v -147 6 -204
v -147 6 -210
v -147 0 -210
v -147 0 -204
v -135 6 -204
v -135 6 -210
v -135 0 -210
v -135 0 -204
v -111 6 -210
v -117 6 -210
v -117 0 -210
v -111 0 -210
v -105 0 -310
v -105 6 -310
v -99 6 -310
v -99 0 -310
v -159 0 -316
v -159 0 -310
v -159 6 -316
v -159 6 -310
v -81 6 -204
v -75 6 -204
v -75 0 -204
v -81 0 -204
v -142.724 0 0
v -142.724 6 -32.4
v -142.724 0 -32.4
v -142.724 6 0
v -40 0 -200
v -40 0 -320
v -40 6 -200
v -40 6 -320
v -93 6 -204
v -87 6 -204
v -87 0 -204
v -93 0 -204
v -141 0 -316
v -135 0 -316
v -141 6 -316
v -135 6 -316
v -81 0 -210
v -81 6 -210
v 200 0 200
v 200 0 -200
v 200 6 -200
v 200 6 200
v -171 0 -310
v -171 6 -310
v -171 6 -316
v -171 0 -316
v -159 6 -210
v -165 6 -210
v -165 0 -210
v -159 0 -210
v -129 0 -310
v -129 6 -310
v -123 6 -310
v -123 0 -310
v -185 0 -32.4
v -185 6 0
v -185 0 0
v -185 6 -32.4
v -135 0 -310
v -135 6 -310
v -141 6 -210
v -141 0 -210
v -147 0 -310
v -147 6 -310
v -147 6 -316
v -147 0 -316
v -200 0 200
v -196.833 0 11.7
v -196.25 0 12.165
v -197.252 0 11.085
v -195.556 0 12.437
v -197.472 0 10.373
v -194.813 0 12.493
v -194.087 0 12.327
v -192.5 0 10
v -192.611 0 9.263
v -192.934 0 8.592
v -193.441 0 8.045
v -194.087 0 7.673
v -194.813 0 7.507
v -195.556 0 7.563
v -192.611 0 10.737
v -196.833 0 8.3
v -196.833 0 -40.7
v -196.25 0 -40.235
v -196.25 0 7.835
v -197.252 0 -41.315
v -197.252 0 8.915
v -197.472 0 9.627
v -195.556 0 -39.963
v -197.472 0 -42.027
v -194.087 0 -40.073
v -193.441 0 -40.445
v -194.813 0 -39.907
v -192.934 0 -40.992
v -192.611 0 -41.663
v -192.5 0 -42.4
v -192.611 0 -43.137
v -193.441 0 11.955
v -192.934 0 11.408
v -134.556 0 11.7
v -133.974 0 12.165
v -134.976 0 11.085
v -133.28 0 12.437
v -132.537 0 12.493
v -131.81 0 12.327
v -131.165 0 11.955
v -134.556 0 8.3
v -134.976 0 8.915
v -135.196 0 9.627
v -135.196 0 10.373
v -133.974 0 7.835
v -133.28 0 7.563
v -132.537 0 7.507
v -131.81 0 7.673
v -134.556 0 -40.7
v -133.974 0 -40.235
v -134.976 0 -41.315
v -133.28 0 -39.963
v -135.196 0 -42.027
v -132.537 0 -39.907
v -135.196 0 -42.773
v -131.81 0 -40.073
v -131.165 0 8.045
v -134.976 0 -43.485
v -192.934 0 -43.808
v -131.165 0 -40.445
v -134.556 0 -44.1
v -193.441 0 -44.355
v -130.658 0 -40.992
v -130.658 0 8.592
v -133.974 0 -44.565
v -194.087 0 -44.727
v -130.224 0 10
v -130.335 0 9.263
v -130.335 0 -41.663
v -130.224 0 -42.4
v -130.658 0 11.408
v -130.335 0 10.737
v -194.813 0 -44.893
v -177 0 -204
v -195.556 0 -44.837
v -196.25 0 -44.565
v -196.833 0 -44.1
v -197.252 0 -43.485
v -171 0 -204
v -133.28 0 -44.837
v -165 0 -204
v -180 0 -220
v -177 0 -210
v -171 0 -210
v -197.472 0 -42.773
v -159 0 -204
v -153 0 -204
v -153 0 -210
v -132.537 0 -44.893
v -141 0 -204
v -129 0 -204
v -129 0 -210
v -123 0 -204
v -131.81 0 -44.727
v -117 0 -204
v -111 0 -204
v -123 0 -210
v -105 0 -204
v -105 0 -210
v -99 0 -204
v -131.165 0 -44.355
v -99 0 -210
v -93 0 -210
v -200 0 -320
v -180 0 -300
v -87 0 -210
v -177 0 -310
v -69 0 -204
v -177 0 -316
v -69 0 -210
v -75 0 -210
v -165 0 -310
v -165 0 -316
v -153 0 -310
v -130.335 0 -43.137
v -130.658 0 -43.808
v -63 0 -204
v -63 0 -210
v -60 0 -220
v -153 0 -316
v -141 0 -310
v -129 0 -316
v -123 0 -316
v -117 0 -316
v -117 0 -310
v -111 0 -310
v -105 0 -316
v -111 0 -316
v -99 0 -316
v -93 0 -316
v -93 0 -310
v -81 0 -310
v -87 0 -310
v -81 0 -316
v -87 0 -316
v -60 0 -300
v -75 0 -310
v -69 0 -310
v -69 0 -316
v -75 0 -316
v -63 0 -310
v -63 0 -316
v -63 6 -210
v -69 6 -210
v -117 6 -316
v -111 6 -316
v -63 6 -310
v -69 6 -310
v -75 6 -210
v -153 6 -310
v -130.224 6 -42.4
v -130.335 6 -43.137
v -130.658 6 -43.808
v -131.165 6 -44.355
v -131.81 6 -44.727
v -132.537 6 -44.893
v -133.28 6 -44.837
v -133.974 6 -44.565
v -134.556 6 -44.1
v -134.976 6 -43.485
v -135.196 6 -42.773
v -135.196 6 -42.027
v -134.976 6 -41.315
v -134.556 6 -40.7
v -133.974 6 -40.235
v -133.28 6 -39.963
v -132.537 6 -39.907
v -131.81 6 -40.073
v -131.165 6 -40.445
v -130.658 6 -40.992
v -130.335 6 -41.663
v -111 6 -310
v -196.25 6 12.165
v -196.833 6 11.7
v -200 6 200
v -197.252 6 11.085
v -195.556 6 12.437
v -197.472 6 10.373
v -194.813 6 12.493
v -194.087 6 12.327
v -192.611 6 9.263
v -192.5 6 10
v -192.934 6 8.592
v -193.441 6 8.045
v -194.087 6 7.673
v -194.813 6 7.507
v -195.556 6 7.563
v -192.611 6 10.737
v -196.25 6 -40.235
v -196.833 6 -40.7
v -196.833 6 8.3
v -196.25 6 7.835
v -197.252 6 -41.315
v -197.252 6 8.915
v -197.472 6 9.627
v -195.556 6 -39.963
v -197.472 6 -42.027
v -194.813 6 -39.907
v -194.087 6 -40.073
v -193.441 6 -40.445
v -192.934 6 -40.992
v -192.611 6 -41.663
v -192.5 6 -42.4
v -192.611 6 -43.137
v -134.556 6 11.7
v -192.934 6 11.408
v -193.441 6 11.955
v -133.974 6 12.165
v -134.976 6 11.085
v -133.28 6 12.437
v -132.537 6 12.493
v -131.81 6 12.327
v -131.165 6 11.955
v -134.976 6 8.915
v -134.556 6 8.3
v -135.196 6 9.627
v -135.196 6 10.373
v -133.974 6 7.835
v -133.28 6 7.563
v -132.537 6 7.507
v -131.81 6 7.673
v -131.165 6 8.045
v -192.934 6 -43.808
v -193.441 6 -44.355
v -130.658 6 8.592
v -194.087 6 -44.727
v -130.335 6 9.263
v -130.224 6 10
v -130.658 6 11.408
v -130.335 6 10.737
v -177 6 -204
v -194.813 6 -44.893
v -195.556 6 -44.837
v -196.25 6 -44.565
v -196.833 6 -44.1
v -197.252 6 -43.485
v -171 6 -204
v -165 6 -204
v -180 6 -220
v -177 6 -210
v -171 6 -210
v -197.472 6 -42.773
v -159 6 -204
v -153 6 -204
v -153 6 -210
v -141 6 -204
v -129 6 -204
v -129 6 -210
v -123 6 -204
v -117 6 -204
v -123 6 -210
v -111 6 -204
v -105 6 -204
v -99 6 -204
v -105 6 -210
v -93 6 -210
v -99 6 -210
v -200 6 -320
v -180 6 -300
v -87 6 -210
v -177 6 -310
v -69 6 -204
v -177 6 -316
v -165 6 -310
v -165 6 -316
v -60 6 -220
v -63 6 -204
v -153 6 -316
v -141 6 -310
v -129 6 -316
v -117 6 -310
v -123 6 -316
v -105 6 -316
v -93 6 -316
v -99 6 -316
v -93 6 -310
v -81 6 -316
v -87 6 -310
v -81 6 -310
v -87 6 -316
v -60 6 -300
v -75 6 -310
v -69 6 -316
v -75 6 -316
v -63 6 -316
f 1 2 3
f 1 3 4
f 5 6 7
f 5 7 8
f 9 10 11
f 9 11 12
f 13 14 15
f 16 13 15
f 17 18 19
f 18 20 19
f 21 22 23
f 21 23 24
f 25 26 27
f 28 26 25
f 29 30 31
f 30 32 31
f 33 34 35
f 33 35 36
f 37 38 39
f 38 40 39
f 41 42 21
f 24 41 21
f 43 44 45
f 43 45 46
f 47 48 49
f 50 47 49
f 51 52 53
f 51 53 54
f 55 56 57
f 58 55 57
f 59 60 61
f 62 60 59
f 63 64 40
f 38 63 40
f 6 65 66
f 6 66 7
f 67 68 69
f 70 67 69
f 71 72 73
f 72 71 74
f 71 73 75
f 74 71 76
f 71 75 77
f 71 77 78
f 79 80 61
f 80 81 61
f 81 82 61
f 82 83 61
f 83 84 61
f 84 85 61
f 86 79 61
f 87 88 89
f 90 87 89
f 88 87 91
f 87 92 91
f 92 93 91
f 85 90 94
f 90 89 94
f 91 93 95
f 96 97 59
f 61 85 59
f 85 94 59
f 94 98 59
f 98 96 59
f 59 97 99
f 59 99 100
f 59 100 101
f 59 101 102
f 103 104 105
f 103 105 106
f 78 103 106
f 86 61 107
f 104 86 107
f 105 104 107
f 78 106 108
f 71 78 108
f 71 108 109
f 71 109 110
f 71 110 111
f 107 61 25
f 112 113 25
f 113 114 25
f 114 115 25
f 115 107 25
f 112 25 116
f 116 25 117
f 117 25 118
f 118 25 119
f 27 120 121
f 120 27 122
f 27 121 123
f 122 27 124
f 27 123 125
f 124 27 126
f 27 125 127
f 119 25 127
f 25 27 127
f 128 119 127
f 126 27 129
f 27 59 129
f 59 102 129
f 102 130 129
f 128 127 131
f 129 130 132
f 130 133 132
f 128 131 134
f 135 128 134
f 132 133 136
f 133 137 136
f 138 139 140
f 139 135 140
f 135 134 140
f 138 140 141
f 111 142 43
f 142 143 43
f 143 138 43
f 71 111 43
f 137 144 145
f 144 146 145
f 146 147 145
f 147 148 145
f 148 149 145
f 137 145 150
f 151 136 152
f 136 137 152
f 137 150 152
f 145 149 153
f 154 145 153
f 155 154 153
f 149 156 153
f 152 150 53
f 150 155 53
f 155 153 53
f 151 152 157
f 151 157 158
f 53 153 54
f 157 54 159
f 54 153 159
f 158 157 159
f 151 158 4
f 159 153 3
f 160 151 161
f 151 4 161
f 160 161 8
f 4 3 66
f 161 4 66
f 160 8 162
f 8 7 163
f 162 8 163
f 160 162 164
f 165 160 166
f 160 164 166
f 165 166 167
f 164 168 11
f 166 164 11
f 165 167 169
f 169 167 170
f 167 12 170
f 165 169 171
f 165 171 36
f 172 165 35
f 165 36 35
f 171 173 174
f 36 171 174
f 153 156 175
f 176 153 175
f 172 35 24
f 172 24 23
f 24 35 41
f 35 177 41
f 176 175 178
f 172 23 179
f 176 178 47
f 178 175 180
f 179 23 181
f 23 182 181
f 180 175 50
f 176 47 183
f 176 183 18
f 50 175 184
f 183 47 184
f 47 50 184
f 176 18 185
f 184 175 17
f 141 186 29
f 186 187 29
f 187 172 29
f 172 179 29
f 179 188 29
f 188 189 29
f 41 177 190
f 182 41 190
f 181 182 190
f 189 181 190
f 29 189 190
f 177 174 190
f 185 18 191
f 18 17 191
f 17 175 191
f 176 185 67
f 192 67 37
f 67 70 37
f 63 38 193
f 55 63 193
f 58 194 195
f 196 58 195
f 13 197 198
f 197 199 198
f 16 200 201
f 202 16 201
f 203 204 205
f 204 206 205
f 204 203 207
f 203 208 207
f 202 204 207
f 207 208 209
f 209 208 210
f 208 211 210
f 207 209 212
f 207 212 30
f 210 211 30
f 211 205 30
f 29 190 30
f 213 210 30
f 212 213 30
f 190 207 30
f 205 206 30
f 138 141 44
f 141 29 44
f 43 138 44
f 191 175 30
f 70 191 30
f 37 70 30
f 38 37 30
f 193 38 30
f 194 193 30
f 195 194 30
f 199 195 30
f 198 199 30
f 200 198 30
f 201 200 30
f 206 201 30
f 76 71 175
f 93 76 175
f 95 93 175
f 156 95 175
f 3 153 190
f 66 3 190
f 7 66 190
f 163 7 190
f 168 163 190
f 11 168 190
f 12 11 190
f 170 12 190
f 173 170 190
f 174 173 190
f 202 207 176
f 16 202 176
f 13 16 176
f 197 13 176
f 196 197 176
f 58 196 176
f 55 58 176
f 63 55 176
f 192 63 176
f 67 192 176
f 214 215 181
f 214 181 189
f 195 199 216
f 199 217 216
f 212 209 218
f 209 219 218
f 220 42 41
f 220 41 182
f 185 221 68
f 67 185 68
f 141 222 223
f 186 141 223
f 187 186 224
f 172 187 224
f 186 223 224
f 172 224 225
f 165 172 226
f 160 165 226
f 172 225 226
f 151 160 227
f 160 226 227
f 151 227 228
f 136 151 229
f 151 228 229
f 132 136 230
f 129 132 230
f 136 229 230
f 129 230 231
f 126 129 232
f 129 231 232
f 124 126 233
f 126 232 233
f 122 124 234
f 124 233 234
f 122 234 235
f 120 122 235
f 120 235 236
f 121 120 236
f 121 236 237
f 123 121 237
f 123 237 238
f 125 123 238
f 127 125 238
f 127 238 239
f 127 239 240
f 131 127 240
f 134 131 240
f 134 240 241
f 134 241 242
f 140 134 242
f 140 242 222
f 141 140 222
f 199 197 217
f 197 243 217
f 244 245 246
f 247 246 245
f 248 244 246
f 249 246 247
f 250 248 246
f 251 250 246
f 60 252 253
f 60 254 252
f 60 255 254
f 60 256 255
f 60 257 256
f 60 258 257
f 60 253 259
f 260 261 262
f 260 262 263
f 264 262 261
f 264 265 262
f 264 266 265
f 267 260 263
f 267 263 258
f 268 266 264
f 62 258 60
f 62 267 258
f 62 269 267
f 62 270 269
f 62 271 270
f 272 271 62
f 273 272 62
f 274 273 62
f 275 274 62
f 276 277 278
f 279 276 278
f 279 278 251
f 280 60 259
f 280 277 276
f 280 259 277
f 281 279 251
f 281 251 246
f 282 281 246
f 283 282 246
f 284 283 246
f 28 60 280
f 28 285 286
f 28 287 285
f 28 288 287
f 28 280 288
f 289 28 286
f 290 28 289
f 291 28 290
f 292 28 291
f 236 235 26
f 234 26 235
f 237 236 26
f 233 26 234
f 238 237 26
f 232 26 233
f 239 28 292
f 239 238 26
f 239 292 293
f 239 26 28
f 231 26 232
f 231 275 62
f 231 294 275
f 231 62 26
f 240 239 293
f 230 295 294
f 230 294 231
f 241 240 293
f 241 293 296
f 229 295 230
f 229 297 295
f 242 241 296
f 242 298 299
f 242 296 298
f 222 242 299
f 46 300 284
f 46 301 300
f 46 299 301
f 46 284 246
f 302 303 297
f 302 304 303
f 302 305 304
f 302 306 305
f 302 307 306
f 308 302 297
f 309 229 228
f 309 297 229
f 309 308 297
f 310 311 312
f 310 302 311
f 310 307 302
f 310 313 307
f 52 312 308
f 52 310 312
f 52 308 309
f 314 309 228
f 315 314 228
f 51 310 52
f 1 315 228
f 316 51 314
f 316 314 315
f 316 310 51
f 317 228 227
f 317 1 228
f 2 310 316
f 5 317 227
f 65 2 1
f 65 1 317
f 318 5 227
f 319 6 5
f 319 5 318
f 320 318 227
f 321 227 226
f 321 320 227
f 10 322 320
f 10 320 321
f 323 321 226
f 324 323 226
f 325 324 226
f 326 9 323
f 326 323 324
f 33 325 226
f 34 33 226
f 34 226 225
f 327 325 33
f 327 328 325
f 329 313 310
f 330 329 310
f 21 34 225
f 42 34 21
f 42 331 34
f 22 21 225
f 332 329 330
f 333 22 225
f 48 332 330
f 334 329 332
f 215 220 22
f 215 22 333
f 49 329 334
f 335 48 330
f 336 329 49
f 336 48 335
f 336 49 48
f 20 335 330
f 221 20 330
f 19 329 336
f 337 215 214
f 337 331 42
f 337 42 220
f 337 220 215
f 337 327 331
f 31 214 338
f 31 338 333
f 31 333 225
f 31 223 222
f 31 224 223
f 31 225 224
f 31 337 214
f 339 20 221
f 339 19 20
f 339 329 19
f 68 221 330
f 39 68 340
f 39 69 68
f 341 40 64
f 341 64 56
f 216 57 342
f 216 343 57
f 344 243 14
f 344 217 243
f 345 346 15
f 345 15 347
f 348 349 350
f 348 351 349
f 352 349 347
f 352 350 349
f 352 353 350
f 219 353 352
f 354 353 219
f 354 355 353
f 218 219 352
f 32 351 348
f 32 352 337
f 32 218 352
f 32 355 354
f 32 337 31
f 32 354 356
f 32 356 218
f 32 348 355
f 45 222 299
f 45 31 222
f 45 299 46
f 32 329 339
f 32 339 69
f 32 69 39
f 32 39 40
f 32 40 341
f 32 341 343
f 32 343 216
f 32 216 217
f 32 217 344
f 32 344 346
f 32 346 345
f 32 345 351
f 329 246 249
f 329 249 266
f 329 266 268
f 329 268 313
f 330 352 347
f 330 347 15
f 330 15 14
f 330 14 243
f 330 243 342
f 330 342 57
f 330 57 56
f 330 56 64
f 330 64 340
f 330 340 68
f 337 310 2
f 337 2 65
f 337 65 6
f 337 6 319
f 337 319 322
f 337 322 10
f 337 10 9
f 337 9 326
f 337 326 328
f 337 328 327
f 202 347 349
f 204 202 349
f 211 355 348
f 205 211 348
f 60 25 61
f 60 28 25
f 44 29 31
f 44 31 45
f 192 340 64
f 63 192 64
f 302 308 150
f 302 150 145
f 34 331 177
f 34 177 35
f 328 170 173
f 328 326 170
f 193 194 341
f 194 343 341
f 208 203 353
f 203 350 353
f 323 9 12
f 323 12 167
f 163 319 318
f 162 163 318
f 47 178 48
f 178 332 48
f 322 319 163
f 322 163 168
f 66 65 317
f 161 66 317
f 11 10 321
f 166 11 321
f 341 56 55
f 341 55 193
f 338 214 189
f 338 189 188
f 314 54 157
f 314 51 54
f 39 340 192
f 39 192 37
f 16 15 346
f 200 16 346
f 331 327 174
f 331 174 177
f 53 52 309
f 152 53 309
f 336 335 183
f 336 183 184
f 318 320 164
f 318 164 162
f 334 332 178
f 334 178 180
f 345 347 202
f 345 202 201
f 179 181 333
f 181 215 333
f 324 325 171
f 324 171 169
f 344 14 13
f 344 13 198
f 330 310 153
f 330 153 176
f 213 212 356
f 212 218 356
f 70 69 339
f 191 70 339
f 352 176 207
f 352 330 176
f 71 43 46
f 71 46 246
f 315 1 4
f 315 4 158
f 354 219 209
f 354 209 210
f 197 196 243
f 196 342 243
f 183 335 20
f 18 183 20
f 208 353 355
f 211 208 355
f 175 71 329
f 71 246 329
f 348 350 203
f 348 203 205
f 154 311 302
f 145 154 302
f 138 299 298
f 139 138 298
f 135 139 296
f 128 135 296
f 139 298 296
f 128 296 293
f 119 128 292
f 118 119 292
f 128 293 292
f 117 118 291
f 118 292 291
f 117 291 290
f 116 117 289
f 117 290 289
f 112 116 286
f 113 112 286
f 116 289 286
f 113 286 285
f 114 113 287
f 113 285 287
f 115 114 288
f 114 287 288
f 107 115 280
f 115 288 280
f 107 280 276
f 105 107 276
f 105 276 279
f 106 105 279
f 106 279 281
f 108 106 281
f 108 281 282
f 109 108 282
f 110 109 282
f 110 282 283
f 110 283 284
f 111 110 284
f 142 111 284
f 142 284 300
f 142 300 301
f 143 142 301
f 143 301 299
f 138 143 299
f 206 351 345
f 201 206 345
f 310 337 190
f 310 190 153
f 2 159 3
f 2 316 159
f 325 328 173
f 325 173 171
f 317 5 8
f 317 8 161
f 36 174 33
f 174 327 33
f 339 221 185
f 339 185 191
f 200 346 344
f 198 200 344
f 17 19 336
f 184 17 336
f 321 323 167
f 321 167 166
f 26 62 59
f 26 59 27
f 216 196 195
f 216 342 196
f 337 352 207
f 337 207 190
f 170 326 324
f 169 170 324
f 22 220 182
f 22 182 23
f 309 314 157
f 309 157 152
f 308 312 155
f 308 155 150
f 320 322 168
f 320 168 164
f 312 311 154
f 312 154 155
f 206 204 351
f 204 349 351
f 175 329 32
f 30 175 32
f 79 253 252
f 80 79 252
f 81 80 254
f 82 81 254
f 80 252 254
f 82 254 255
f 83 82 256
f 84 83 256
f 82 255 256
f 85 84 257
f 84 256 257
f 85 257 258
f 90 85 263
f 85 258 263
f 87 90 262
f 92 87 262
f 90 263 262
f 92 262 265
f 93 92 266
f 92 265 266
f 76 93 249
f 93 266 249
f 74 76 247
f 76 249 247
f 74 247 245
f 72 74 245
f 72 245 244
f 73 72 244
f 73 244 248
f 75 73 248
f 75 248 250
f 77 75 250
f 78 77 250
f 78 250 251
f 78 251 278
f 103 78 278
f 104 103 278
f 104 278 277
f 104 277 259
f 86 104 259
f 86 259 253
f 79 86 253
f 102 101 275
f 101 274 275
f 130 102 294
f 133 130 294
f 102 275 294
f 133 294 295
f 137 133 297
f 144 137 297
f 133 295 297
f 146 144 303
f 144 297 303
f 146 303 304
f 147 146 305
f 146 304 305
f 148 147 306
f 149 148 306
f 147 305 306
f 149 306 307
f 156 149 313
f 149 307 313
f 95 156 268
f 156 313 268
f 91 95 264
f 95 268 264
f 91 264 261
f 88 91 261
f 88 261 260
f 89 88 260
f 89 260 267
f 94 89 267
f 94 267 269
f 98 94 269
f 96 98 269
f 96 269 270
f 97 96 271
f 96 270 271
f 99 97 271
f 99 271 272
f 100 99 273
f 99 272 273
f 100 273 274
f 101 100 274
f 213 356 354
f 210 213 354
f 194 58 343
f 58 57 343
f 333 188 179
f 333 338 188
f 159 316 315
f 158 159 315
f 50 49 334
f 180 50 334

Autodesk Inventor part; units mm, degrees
ref_plane "YZ Plane" through (0, 0, 0) normal (1, 0, 0) x (0, 1, 0)
ref_plane "XZ Plane" through (0, 0, 0) normal (0, 1, 0) x (-1, 0, 0)
ref_plane "XY Plane" through (0, 0, 0) normal (0, 0, 1) x (1, 0, 0)
sketch "Sketch1" plane through (0, 0, 0) normal (0, 1, 0) x (-1, 0, 0)
  line L0 (-200, 200) -> (200, 200)
  line L1 (200, 200) -> (200, -200)
  line L2 (200, -200) -> (-200, -200)
  line L3 (-200, -200) -> (-200, 200)
  line L4 (-200, 200) -> (200, -200) construction
  line L5 (200, 200) -> (-200, -200) construction
  point P0 (0, 0)
  dimension "d0" = 400
  dimension "d1" = 400
extrude "Extrusion1" add sketch "Sketch1" along normal blind 6
sketch "Sketch2" plane through (0, 6, 0) normal (0, 1, 0) x (1, 0, 0)
  line L0 (-190, -5) -> (-137.7238, -5)
  line L1 (-137.7238, -5) -> (-137.7238, 37.4)
  line L2 (-190, 37.4) -> (-137.7238, 37.4)
  line L3 (-190, -5) -> (-190, 37.4)
  line L4 (-142.7238, 32.4) -> (-142.7238, 0)
  line L5 (-142.7238, 0) -> (-185, 0)
  line L6 (-185, 0) -> (-185, 32.4)
  line L7 (-185, 32.4) -> (-142.7238, 32.4)
  line L8 (-127.7238, 47.4) -> (-127.7238, -15)
  line L9 (-127.7238, -15) -> (-200, -15)
  line L10 (-200, -15) -> (-200, 47.4)
  line L11 (-200, 47.4) -> (-127.7238, 47.4)
  line L12 (-132.7238, 42.4) -> (-132.7238, -10) construction
  line L13 (-132.7238, -10) -> (-195, -10) construction
  line L14 (-195, -10) -> (-195, 42.4) construction
  line L15 (-195, 42.4) -> (-132.7238, 42.4) construction
  circle A0 centre (-132.7238, 42.4) radius 2.5
  circle A1 centre (-195, 42.4) radius 2.5
  circle A2 centre (-195, -10) radius 2.5
  circle A3 centre (-132.7238, -10) radius 2.5
  line L16 (-200, -200) -> (200, -200) projected
  line L17 (-200, 200) -> (-200, -200) projected
  point P0 (0, 0)
  point P1 (-163.8619, -15)
  dimension "d4" = 5
  dimension "d5" = 10
  dimension "d6" = 5
  dimension "d7" = 5
  dimension "d8" = 5
  dimension "d9" = 5
  dimension "d10" = 5
  dimension "d11" = 62.4
  dimension "d12" = 72.2762
  dimension "d13" = 42.4
  dimension "d14" = 52.2762
  dimension "d18" = 185
extrude "Extrusion2" cut sketch "Sketch2" against normal through all contours L4 L5 L6 L7 | A0 | A1 | A2 | A3
sketch "Sketch3" plane through (0, 6, 0) normal (0, 1, 0) x (1, 0, 0)
  line L0 (200, 200) -> (-200, 200) projected
  line L1 (-200, 200) -> (-200, 320)
  line L2 (-200, 320) -> (-40, 320)
  line L3 (-40, 320) -> (-40, 200)
  line L4 (-180, 300) -> (-60, 300)
  line L5 (-60, 300) -> (-60, 220)
  line L6 (-60, 220) -> (-180, 220)
  line L7 (-180, 220) -> (-180, 300)
  point P0 (0, 0)
  point P1 (-120, 300)
  dimension "d19" = 120
  dimension "d20" = 160
  dimension "d21" = 120
  dimension "d22" = 80
  dimension "d23" = 20
  dimension "d24" = 20
extrude "Extrusion3" add sketch "Sketch3" against normal blind 6
sketch "Sketch4" plane through (0, 6, 0) normal (0, 1, 0) x (1, 0, 0)
  line L0 (-180, 210) -> (-60, 210)
  line L1 (-60, 210) -> (-60, 204)
  line L2 (-60, 204) -> (-180, 204)
  line L3 (-180, 204) -> (-180, 210)
  line L4 (-60, 220) -> (-180, 220) projected
  line L5 (-200, 320) -> (-200, -200) projected
  line L6 (-177, 210) -> (-177, 204)
  line L7 (-171, 210) -> (-171, 204)
  line L8 (-171, 210) -> (-171, 204)
  line L9 (-165, 210) -> (-165, 204)
  line L10 (-165, 210) -> (-165, 204)
  line L11 (-159, 210) -> (-159, 204)
  line L12 (-159, 210) -> (-159, 204)
  line L13 (-153, 210) -> (-153, 204)
  line L14 (-153, 210) -> (-153, 204)
  line L15 (-147, 210) -> (-147, 204)
  line L16 (-147, 210) -> (-147, 204)
  line L17 (-141, 210) -> (-141, 204)
  line L18 (-141, 210) -> (-141, 204)
  line L19 (-135, 210) -> (-135, 204)
  line L20 (-135, 210) -> (-135, 204)
  line L21 (-129, 210) -> (-129, 204)
  line L22 (-129, 210) -> (-129, 204)
  line L23 (-123, 210) -> (-123, 204)
  line L24 (-123, 210) -> (-123, 204)
  line L25 (-117, 210) -> (-117, 204)
  line L26 (-117, 210) -> (-117, 204)
  line L27 (-111, 210) -> (-111, 204)
  line L28 (-111, 210) -> (-111, 204)
  line L29 (-105, 210) -> (-105, 204)
  line L30 (-105, 210) -> (-105, 204)
  line L31 (-99, 210) -> (-99, 204)
  line L32 (-99, 210) -> (-99, 204)
  line L33 (-93, 210) -> (-93, 204)
  line L34 (-93, 210) -> (-93, 204)
  line L35 (-87, 210) -> (-87, 204)
  line L36 (-87, 210) -> (-87, 204)
  line L37 (-81, 210) -> (-81, 204)
  line L38 (-81, 210) -> (-81, 204)
  line L39 (-75, 210) -> (-75, 204)
  line L40 (-75, 210) -> (-75, 204)
  line L41 (-69, 210) -> (-69, 204)
  line L42 (-69, 210) -> (-69, 204)
  line L43 (-63, 210) -> (-63, 204)
  line L44 (-180, 220) -> (-180, 300) projected
  line L45 (-180, 300) -> (-60, 300) projected
  line L46 (-60, 300) -> (-60, 220) projected
  line L47 (-180, 260) -> (-60, 260) construction
  line L48 (-180, 310) -> (-60, 310)
  line L49 (-60, 310) -> (-60, 316)
  line L50 (-60, 316) -> (-180, 316)
  line L51 (-180, 316) -> (-180, 310)
  line L52 (-177, 310) -> (-177, 316)
  line L53 (-171, 310) -> (-171, 316)
  line L54 (-171, 310) -> (-171, 316)
  line L55 (-165, 310) -> (-165, 316)
  line L56 (-165, 310) -> (-165, 316)
  line L57 (-159, 310) -> (-159, 316)
  line L58 (-159, 310) -> (-159, 316)
  line L59 (-153, 310) -> (-153, 316)
  line L60 (-153, 310) -> (-153, 316)
  line L61 (-147, 310) -> (-147, 316)
  line L62 (-147, 310) -> (-147, 316)
  line L63 (-141, 310) -> (-141, 316)
  line L64 (-141, 310) -> (-141, 316)
  line L65 (-135, 310) -> (-135, 316)
  line L66 (-135, 310) -> (-135, 316)
  line L67 (-129, 310) -> (-129, 316)
  line L68 (-129, 310) -> (-129, 316)
  line L69 (-123, 310) -> (-123, 316)
  line L70 (-123, 310) -> (-123, 316)
  line L71 (-117, 310) -> (-117, 316)
  line L72 (-117, 310) -> (-117, 316)
  line L73 (-111, 310) -> (-111, 316)
  line L74 (-111, 310) -> (-111, 316)
  line L75 (-105, 310) -> (-105, 316)
  line L76 (-105, 310) -> (-105, 316)
  line L77 (-99, 310) -> (-99, 316)
  line L78 (-99, 310) -> (-99, 316)
  line L79 (-93, 310) -> (-93, 316)
  line L80 (-93, 310) -> (-93, 316)
  line L81 (-87, 310) -> (-87, 316)
  line L82 (-87, 310) -> (-87, 316)
  line L83 (-81, 310) -> (-81, 316)
  line L84 (-81, 310) -> (-81, 316)
  line L85 (-75, 310) -> (-75, 316)
  line L86 (-75, 310) -> (-75, 316)
  line L87 (-69, 310) -> (-69, 316)
  line L88 (-69, 310) -> (-69, 316)
  line L89 (-63, 310) -> (-63, 316)
  point P0 (0, 0)
  point P1 (-180, 207)
  point P2 (-177, 207)
  point P3 (-171, 207)
  point P4 (-165, 207)
  point P5 (-159, 207)
  point P6 (-153, 207)
  point P7 (-147, 207)
  point P8 (-141, 207)
  point P9 (-135, 207)
  point P10 (-129, 207)
  point P11 (-123, 207)
  point P12 (-117, 207)
  point P13 (-111, 207)
  point P14 (-105, 207)
  point P15 (-99, 207)
  point P16 (-93, 207)
  point P17 (-87, 207)
  point P18 (-81, 207)
  point P19 (-75, 207)
  point P20 (-69, 207)
  point P21 (-180, 313)
  point P22 (-177, 313)
  point P23 (-171, 313)
  point P24 (-165, 313)
  point P25 (-159, 313)
  point P26 (-153, 313)
  point P27 (-147, 313)
  point P28 (-141, 313)
  point P29 (-135, 313)
  point P30 (-129, 313)
  point P31 (-123, 313)
  point P32 (-117, 313)
  point P33 (-111, 313)
  point P34 (-105, 313)
  point P35 (-99, 313)
  point P36 (-93, 313)
  point P37 (-87, 313)
  point P38 (-81, 313)
  point P39 (-75, 313)
  point P40 (-69, 313)
  dimension "d27" = 120
  dimension "d28" = 6
  dimension "d29" = 10
  dimension "d30" = 20
  dimension "d31" = 3
  dimension "d32" = 6
  dimension "d35" = 6
extrude "Extrusion4" cut sketch "Sketch4" against normal blind 6 contours L0 L7 L2 L6 | L0 L11 L2 L9 | L0 L15 L2 L13 | L0 L19 L2 L17 | L0 L23 L2 L21 | L0 L27 L2 L25 | L0 L31 L2 L29 | L0 L35 L2 L33 | L0 L39 L2 L37 | L0 L43 L2 L41 | L52 L50 L53 L48 | L55 L50 L57 L48 | L59 L50 L61 L48 | L63 L50 L65 L48 | L67 L50 L69 L48 | L71 L50 L73 L48 | L75 L50 L77 L48 | L79 L50 L81 L48 | L83 L50 L85 L48 | L87 L50 L89 L48
sketch "Sketch5" plane through (0, 6, 0) normal (0, 1, 0) x (1, 0, 0)
  line L0 (200, -200) -> (200, 200) projected
  line L1 (200, 200) -> (-40, 200) projected
  line L2 (200, 0) -> (-40, 0)
  line L3 (-40, 0) -> (-40, 200)
  line L4 (-40, 200) -> (200, 200)
  line L5 (200, 200) -> (200, 0)
  point P0 (0, 0)
  dimension "d42" = 240
equation "\"d40\" = d32"
properties part number "base zzzz"
